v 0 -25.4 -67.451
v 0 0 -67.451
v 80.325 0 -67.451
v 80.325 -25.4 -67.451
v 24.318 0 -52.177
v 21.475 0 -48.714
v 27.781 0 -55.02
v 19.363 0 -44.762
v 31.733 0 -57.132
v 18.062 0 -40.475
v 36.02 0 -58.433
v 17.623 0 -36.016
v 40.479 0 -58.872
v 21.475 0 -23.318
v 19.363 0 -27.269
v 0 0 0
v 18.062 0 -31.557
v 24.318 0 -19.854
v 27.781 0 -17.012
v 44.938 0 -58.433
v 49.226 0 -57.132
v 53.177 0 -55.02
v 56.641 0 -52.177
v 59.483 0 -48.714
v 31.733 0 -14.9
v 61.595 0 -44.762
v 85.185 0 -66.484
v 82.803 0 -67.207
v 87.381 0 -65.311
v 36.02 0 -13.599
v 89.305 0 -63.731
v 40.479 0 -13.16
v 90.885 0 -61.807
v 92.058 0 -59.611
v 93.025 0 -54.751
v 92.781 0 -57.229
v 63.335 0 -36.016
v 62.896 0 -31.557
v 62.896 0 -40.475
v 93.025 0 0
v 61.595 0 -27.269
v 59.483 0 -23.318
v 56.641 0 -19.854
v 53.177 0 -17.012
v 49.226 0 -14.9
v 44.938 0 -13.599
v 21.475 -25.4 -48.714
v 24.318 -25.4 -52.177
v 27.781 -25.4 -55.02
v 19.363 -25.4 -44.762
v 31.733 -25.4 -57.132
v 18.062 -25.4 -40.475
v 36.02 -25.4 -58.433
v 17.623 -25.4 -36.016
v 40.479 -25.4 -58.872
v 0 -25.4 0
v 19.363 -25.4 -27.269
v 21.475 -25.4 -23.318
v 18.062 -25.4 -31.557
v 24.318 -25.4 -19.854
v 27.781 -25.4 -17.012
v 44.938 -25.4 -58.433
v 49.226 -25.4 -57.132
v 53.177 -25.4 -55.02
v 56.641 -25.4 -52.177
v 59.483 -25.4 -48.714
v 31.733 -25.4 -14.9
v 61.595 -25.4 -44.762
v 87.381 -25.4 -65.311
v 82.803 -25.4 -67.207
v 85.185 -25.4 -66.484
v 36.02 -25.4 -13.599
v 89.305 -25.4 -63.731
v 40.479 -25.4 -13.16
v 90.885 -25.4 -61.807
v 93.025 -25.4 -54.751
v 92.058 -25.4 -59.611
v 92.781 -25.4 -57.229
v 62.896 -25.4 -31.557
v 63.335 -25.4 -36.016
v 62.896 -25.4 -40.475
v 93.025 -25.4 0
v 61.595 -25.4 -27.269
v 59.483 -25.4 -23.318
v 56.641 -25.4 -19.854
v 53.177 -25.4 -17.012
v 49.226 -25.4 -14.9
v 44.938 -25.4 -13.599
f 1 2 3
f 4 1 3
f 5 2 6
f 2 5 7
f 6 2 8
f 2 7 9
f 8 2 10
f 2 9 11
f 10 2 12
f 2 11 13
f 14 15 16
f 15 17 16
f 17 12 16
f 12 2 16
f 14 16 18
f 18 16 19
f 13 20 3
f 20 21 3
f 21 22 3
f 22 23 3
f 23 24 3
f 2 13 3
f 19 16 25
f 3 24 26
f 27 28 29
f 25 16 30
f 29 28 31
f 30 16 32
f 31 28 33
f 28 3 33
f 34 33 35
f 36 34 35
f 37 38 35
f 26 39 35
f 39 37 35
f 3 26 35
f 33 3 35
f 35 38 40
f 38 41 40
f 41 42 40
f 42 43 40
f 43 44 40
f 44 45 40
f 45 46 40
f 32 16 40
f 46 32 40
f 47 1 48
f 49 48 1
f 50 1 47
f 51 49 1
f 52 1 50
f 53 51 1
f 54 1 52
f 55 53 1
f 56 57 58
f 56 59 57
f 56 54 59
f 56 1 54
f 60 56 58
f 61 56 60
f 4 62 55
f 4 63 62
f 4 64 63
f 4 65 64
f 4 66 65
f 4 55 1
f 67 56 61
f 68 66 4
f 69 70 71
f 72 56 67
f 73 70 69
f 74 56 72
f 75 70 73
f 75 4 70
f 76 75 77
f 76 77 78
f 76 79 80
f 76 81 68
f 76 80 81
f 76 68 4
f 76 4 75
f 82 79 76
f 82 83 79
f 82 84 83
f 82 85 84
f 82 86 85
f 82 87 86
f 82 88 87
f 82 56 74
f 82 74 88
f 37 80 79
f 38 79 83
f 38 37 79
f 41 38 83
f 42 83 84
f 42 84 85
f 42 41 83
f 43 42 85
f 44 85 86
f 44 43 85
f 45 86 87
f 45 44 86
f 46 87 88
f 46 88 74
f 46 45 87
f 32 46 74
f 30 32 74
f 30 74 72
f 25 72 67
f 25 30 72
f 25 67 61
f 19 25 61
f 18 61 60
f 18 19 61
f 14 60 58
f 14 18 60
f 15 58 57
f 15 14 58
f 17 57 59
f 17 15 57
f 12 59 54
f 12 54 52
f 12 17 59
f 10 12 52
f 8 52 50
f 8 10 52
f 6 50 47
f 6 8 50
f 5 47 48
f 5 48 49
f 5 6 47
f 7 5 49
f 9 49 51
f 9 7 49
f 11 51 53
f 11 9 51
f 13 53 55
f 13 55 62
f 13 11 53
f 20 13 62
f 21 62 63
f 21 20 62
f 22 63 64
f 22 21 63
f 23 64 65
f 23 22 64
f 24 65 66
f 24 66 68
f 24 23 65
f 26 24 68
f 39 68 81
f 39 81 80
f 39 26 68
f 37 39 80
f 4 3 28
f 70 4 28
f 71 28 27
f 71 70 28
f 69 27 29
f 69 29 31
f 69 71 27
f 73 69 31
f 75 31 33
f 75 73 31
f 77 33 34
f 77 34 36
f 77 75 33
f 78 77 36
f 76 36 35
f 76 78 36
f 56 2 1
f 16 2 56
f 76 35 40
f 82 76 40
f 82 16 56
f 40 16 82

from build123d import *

# Parameters (mm, degrees)
F0_W     = 93.024962
F0_H     = 67.451157
F2_DEPTH = 25.4
F3_R     = 12.7
F4_R     = 22.855993
F5_DEPTH = 25.4


with BuildPart() as f2:
    # F0 (on Front) → F2 (new body)
    with BuildSketch(Plane.XZ):
        with Locations((46.512481, -33.725578)):
            Rectangle(F0_W, F0_H)
    extrude(amount=F2_DEPTH)

    # F3
    f3_edges = [f2.edges().sort_by_distance(p)[0] for p in [
        (93.024962, -12.7, -67.451157),
    ]]
    fillet(f3_edges, radius=F3_R)

    # F4 (on face) → F5 (cut)
    with BuildSketch(Plane.XZ):
        with Locations((40.479131, -36.015701)):
            Circle(F4_R)
    extrude(amount=F5_DEPTH, mode=Mode.SUBTRACT)


solid = f2.part
